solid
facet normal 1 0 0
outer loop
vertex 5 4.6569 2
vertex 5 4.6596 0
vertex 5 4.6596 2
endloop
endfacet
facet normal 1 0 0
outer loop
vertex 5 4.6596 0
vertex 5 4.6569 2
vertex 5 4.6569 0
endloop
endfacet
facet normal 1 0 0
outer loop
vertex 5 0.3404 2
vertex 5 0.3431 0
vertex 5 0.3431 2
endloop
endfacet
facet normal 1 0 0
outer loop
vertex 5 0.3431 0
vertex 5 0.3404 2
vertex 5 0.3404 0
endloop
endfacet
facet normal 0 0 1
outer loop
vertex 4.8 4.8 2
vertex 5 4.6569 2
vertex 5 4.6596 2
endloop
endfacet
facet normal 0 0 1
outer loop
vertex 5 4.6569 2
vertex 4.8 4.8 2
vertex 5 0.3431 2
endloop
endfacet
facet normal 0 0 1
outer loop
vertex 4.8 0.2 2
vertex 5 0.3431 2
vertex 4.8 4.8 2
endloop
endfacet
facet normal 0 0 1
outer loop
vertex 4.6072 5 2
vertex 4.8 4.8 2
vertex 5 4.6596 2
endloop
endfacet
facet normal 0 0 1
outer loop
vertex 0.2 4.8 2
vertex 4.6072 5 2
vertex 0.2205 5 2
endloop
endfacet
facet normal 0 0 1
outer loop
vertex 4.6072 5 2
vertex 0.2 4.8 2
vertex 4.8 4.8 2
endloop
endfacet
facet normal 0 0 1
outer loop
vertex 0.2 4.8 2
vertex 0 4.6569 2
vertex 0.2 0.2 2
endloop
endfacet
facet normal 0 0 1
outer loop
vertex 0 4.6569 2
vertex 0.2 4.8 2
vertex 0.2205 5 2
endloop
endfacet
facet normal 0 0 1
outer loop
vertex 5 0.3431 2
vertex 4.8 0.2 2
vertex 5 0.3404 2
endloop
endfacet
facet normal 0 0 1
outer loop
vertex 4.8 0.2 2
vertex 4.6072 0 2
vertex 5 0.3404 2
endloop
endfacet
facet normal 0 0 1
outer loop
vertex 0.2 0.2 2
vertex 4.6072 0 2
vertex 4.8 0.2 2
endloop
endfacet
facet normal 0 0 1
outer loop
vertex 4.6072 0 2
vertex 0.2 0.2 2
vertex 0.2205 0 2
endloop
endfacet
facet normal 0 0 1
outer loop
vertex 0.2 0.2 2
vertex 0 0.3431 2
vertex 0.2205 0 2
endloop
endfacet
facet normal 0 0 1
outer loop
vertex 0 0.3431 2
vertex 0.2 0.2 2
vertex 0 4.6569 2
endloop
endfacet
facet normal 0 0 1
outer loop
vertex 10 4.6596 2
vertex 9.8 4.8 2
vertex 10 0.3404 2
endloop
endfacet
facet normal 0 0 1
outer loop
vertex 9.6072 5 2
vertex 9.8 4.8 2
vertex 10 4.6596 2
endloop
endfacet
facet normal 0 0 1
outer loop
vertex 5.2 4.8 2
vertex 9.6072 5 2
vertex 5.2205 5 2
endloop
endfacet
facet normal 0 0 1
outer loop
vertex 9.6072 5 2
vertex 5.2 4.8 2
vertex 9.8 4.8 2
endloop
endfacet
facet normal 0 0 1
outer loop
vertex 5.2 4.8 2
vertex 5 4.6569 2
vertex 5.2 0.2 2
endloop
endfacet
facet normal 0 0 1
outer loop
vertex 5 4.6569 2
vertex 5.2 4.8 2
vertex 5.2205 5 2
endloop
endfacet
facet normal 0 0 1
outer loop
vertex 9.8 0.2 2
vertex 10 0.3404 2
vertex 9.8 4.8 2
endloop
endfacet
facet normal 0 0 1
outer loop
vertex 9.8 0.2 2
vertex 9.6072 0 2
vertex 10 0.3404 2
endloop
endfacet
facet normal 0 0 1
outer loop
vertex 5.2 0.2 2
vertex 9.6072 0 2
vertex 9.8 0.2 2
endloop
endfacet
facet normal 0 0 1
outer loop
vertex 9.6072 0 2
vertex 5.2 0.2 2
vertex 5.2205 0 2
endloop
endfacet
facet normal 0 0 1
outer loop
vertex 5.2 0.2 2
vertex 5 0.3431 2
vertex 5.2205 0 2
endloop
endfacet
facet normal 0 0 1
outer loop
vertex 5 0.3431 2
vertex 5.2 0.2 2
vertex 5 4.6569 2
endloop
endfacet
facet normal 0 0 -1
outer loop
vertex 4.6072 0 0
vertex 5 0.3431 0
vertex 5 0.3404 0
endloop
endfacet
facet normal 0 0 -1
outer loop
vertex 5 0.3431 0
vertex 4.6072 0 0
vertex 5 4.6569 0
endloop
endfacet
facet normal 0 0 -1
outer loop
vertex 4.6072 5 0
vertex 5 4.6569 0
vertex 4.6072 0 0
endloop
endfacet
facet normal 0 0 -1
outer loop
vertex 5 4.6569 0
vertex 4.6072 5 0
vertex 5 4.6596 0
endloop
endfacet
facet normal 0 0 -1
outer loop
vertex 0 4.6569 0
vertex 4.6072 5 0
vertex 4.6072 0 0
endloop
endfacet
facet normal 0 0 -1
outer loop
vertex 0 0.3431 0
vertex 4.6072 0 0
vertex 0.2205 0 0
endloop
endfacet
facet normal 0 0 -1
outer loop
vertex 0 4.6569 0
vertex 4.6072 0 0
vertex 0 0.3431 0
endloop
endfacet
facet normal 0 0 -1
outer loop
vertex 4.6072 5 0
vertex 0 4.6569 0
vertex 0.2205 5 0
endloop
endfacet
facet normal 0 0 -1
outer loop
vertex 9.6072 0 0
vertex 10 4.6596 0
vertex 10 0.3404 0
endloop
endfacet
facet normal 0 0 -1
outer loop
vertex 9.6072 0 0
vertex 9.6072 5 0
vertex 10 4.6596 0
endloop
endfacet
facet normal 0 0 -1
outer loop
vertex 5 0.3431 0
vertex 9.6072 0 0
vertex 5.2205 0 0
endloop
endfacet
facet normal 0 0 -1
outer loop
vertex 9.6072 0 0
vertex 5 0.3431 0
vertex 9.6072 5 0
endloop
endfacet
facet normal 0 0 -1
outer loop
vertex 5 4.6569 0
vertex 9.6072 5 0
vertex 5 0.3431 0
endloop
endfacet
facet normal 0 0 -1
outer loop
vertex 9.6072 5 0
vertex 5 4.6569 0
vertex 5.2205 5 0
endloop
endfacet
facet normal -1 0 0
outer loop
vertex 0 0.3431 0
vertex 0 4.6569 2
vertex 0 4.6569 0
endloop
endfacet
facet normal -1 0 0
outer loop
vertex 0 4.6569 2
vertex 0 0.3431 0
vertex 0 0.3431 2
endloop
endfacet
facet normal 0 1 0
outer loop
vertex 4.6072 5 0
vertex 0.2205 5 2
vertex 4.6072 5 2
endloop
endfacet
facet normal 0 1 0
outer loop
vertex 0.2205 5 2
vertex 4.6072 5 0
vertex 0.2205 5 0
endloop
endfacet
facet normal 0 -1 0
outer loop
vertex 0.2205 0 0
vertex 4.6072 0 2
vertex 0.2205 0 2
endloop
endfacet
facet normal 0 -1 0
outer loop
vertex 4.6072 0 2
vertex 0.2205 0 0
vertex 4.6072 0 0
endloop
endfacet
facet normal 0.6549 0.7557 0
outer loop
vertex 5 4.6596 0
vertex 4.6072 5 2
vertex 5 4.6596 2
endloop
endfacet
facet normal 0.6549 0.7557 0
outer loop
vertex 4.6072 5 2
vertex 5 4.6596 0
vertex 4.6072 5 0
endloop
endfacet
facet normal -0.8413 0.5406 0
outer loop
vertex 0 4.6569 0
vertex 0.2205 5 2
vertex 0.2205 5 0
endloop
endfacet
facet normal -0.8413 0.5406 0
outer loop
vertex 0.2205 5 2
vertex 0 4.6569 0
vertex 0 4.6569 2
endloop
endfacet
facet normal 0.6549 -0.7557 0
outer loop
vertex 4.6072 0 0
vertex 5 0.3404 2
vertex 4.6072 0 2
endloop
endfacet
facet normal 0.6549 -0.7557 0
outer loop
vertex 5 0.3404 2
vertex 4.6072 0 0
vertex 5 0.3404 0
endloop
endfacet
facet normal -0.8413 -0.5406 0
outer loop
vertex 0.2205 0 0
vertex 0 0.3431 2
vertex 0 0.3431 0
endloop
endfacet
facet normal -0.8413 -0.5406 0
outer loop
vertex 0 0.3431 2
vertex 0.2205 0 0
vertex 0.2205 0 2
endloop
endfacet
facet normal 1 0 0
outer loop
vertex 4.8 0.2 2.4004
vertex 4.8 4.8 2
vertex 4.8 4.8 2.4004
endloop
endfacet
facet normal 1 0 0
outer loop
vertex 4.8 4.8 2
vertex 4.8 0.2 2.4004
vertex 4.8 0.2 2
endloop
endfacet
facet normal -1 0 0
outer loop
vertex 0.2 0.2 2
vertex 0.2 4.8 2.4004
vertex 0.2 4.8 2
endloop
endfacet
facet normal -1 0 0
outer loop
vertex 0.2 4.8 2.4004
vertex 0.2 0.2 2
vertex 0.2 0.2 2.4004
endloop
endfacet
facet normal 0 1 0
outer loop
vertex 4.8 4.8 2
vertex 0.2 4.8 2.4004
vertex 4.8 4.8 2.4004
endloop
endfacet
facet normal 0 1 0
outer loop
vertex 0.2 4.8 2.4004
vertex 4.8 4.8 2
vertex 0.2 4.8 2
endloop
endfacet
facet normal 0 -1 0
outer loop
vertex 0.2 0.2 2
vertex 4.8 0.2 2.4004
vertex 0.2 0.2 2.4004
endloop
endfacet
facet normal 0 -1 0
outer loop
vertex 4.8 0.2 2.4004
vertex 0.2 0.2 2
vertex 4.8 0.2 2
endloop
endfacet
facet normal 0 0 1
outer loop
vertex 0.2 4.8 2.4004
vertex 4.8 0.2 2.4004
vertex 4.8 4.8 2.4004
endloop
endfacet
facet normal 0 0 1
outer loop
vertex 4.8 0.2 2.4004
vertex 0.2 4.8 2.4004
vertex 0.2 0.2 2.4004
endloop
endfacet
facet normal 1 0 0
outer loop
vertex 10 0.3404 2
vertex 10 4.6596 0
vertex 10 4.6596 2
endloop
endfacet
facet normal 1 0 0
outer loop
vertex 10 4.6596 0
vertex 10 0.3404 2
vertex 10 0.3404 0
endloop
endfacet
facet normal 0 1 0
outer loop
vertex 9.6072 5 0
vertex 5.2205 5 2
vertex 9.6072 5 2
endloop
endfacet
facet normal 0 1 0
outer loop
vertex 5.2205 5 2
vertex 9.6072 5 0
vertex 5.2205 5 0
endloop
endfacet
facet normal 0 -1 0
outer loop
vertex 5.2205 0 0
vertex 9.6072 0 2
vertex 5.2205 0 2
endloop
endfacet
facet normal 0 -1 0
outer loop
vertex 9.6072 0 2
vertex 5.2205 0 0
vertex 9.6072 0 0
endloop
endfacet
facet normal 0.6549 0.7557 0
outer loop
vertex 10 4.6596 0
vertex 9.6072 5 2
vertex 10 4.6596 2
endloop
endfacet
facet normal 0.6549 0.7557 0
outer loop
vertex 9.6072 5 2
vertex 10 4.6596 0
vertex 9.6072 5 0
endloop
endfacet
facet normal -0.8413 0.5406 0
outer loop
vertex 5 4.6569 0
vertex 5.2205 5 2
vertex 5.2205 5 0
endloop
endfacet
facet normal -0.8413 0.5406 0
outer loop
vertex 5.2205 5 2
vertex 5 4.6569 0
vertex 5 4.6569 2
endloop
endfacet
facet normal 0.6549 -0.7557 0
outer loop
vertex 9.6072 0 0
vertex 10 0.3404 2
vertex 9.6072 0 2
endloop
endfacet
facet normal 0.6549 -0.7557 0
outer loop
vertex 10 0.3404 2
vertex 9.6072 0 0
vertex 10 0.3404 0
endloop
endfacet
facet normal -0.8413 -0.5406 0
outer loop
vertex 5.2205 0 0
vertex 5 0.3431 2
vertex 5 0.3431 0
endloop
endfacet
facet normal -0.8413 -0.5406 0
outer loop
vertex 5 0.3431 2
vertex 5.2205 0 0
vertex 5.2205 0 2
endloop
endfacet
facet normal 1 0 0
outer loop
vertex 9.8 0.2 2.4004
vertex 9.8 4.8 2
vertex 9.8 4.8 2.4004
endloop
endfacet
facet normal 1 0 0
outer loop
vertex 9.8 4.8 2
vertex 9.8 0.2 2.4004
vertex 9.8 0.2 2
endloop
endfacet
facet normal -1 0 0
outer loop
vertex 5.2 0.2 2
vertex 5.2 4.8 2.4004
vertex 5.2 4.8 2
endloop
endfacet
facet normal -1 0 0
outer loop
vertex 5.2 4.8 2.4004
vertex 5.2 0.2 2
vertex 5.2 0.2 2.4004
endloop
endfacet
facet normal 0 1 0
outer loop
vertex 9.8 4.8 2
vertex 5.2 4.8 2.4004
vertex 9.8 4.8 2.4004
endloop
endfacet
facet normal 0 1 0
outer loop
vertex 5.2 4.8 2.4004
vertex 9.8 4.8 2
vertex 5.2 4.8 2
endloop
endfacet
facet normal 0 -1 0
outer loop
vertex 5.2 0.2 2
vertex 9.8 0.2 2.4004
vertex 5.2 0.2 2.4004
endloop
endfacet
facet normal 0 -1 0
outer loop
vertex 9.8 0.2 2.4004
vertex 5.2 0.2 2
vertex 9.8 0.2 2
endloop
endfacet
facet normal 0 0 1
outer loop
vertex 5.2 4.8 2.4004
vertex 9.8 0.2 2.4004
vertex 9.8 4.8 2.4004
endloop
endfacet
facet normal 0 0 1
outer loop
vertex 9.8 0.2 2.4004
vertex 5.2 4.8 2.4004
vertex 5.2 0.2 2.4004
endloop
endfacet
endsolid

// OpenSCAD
tetris_white=true;
tetris_cyan=true;
tetris_magenta=true;
tetris_yellow=true;


// color("white") tetris_base1();
// color("cyan") tetris_t1();
// color("magenta") tetris_t2();


l=5;     // size of base
l2=4.6;  // size of top plates
t=0.2002;  // thickness of top plates
r=l/2;   // for base fillets
d=2;     // for base fillets

// Loc = [0, 0, 0], col1 = cyan, col2 = magenta 
union(){
    if(tetris_white==true){
        color("white")
        tetris_base1();
    }

    if(tetris_cyan==true){
        color("cyan")
        tetris_t1();
    }

    if(tetris_magenta==true){
        color("magenta")
        tetris_t2();
    }
}

// Loc = [0, l, 0], col1 = white, col2 = yellow 
translate([l, 0, 0])
union(){
    if(tetris_white==true){
        color("white")
        tetris_base1();
    }

    if(tetris_white==true){
        color("white")
        tetris_t1();
    }

    if(tetris_yellow==true){
        color("yellow")
        tetris_t2();
    }
}

// modules of the building parts
module tetris_base1(){
    color()
    intersection() {
        translate([0,0,0])
            cube([l, l, d]);
        translate([r, r, -d*0.01]){
            cylinder(h=d*1.02, d=r*1.6/sin(atan(1/sqrt(2)))-r/22);
        }
    }    
}

module tetris_t1(){
    o1=(l-l2)/2;
    translate([o1,o1,d])
        cube([l2, l2, t]);
}

module tetris_t2(){
    o1=(l-l2)/2;
    translate([o1,o1,d+t])
        cube([l2, l2, t]);
}
